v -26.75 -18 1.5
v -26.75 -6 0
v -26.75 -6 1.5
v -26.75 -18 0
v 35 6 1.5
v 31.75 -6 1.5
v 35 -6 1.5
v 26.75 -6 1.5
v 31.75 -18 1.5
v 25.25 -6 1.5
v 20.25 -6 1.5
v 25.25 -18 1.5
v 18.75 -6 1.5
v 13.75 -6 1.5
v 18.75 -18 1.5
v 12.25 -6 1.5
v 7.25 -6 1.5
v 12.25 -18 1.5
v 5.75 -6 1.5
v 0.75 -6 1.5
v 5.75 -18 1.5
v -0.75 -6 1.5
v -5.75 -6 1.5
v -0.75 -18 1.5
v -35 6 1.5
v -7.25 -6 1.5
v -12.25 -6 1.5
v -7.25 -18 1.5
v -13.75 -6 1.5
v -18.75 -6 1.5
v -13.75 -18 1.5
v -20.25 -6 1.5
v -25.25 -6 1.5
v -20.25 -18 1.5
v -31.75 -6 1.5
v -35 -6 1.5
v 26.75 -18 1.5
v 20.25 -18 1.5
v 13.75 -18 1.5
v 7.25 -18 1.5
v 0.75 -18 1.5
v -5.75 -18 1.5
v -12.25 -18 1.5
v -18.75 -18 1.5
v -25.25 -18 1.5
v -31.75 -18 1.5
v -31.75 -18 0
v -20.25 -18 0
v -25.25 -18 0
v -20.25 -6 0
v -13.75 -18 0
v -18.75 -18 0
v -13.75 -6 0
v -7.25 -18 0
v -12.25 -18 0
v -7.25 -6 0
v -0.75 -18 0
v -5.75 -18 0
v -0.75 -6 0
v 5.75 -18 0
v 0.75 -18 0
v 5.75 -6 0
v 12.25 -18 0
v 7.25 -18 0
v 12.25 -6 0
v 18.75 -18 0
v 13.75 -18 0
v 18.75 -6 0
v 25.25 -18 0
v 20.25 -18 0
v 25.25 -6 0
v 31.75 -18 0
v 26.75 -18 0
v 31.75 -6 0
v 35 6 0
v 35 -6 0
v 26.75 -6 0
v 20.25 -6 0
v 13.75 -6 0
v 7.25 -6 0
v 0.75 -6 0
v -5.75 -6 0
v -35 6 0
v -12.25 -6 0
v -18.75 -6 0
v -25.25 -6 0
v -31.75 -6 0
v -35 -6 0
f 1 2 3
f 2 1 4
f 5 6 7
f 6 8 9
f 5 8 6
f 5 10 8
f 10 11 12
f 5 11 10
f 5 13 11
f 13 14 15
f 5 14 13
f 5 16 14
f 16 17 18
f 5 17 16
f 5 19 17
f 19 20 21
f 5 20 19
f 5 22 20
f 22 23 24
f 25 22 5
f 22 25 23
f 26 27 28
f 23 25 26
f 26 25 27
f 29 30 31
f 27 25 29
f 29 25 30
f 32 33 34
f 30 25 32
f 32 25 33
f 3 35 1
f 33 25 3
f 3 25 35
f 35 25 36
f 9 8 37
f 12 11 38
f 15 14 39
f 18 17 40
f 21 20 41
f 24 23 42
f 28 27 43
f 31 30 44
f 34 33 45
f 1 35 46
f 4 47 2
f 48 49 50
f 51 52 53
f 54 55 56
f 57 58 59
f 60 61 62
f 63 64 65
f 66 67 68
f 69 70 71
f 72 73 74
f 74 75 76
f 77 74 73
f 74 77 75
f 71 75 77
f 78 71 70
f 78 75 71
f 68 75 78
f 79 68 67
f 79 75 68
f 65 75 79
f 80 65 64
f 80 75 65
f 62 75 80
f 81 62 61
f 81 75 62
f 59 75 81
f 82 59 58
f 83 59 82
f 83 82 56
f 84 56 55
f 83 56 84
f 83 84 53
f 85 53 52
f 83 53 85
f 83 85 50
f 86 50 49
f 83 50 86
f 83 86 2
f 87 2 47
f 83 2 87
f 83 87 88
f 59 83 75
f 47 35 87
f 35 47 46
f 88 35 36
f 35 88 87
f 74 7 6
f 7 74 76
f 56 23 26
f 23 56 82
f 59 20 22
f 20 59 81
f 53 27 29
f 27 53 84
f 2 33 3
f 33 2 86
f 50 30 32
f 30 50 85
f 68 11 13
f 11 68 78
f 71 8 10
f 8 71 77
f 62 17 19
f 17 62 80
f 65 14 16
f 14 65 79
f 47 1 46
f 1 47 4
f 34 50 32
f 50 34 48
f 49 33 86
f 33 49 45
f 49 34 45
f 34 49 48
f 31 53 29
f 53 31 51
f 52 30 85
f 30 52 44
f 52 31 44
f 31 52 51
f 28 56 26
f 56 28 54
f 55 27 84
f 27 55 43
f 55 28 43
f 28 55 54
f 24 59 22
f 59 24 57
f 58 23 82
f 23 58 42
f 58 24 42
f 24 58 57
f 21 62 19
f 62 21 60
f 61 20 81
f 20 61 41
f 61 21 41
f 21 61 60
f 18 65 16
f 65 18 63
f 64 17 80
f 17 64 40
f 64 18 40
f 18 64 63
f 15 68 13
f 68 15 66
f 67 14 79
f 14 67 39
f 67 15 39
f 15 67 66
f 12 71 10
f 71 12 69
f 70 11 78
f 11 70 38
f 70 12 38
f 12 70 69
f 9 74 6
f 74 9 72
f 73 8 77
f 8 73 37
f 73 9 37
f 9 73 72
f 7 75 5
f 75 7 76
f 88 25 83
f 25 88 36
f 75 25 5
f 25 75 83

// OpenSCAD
// --------------- Dimensions (mm) ----------------
// Spine (back bar)
spine_length = 70;      // total length along X
spine_width  = 12;      // width along Y
thickness    = 1.5;     // plate thickness (Z)

// Teeth (wells)
tooth_count = 10;       // number of teeth
tooth_width = 5.0;      // width of each tooth along X
tooth_length = 12;      // length of each tooth along Y (extends -Y)
tooth_gap   = 1.5;      // gap between neighbouring teeth (X)

// ----------------- Calculated helpers ----------------
total_tooth_occupied = tooth_count*tooth_width + (tooth_count-1)*tooth_gap;
margin_side = (spine_length - total_tooth_occupied)/2;   // unused side margin
start_x = -spine_length/2 + margin_side;                // X‑position of first tooth's left edge

// Set resolution for any curved primitives (none used, but keep $fn)
$fn = 64;

// ----------------- Model -----------------
module comb() {
    // Spine (solid rectangular plate)
    translate([-spine_length/2, -spine_width/2, 0])
        cube([spine_length, spine_width, thickness]);

    // Teeth (rectangular wells) – generated with a for‑loop
    for (i = [0:tooth_count-1]) {
        x_pos = start_x + i*(tooth_width + tooth_gap);
        translate([x_pos, -spine_width/2 - tooth_length, 0])
            cube([tooth_width, tooth_length, thickness]);
    }
}

// Render the part lying flat on the build plate (Z = 0)
comb();
